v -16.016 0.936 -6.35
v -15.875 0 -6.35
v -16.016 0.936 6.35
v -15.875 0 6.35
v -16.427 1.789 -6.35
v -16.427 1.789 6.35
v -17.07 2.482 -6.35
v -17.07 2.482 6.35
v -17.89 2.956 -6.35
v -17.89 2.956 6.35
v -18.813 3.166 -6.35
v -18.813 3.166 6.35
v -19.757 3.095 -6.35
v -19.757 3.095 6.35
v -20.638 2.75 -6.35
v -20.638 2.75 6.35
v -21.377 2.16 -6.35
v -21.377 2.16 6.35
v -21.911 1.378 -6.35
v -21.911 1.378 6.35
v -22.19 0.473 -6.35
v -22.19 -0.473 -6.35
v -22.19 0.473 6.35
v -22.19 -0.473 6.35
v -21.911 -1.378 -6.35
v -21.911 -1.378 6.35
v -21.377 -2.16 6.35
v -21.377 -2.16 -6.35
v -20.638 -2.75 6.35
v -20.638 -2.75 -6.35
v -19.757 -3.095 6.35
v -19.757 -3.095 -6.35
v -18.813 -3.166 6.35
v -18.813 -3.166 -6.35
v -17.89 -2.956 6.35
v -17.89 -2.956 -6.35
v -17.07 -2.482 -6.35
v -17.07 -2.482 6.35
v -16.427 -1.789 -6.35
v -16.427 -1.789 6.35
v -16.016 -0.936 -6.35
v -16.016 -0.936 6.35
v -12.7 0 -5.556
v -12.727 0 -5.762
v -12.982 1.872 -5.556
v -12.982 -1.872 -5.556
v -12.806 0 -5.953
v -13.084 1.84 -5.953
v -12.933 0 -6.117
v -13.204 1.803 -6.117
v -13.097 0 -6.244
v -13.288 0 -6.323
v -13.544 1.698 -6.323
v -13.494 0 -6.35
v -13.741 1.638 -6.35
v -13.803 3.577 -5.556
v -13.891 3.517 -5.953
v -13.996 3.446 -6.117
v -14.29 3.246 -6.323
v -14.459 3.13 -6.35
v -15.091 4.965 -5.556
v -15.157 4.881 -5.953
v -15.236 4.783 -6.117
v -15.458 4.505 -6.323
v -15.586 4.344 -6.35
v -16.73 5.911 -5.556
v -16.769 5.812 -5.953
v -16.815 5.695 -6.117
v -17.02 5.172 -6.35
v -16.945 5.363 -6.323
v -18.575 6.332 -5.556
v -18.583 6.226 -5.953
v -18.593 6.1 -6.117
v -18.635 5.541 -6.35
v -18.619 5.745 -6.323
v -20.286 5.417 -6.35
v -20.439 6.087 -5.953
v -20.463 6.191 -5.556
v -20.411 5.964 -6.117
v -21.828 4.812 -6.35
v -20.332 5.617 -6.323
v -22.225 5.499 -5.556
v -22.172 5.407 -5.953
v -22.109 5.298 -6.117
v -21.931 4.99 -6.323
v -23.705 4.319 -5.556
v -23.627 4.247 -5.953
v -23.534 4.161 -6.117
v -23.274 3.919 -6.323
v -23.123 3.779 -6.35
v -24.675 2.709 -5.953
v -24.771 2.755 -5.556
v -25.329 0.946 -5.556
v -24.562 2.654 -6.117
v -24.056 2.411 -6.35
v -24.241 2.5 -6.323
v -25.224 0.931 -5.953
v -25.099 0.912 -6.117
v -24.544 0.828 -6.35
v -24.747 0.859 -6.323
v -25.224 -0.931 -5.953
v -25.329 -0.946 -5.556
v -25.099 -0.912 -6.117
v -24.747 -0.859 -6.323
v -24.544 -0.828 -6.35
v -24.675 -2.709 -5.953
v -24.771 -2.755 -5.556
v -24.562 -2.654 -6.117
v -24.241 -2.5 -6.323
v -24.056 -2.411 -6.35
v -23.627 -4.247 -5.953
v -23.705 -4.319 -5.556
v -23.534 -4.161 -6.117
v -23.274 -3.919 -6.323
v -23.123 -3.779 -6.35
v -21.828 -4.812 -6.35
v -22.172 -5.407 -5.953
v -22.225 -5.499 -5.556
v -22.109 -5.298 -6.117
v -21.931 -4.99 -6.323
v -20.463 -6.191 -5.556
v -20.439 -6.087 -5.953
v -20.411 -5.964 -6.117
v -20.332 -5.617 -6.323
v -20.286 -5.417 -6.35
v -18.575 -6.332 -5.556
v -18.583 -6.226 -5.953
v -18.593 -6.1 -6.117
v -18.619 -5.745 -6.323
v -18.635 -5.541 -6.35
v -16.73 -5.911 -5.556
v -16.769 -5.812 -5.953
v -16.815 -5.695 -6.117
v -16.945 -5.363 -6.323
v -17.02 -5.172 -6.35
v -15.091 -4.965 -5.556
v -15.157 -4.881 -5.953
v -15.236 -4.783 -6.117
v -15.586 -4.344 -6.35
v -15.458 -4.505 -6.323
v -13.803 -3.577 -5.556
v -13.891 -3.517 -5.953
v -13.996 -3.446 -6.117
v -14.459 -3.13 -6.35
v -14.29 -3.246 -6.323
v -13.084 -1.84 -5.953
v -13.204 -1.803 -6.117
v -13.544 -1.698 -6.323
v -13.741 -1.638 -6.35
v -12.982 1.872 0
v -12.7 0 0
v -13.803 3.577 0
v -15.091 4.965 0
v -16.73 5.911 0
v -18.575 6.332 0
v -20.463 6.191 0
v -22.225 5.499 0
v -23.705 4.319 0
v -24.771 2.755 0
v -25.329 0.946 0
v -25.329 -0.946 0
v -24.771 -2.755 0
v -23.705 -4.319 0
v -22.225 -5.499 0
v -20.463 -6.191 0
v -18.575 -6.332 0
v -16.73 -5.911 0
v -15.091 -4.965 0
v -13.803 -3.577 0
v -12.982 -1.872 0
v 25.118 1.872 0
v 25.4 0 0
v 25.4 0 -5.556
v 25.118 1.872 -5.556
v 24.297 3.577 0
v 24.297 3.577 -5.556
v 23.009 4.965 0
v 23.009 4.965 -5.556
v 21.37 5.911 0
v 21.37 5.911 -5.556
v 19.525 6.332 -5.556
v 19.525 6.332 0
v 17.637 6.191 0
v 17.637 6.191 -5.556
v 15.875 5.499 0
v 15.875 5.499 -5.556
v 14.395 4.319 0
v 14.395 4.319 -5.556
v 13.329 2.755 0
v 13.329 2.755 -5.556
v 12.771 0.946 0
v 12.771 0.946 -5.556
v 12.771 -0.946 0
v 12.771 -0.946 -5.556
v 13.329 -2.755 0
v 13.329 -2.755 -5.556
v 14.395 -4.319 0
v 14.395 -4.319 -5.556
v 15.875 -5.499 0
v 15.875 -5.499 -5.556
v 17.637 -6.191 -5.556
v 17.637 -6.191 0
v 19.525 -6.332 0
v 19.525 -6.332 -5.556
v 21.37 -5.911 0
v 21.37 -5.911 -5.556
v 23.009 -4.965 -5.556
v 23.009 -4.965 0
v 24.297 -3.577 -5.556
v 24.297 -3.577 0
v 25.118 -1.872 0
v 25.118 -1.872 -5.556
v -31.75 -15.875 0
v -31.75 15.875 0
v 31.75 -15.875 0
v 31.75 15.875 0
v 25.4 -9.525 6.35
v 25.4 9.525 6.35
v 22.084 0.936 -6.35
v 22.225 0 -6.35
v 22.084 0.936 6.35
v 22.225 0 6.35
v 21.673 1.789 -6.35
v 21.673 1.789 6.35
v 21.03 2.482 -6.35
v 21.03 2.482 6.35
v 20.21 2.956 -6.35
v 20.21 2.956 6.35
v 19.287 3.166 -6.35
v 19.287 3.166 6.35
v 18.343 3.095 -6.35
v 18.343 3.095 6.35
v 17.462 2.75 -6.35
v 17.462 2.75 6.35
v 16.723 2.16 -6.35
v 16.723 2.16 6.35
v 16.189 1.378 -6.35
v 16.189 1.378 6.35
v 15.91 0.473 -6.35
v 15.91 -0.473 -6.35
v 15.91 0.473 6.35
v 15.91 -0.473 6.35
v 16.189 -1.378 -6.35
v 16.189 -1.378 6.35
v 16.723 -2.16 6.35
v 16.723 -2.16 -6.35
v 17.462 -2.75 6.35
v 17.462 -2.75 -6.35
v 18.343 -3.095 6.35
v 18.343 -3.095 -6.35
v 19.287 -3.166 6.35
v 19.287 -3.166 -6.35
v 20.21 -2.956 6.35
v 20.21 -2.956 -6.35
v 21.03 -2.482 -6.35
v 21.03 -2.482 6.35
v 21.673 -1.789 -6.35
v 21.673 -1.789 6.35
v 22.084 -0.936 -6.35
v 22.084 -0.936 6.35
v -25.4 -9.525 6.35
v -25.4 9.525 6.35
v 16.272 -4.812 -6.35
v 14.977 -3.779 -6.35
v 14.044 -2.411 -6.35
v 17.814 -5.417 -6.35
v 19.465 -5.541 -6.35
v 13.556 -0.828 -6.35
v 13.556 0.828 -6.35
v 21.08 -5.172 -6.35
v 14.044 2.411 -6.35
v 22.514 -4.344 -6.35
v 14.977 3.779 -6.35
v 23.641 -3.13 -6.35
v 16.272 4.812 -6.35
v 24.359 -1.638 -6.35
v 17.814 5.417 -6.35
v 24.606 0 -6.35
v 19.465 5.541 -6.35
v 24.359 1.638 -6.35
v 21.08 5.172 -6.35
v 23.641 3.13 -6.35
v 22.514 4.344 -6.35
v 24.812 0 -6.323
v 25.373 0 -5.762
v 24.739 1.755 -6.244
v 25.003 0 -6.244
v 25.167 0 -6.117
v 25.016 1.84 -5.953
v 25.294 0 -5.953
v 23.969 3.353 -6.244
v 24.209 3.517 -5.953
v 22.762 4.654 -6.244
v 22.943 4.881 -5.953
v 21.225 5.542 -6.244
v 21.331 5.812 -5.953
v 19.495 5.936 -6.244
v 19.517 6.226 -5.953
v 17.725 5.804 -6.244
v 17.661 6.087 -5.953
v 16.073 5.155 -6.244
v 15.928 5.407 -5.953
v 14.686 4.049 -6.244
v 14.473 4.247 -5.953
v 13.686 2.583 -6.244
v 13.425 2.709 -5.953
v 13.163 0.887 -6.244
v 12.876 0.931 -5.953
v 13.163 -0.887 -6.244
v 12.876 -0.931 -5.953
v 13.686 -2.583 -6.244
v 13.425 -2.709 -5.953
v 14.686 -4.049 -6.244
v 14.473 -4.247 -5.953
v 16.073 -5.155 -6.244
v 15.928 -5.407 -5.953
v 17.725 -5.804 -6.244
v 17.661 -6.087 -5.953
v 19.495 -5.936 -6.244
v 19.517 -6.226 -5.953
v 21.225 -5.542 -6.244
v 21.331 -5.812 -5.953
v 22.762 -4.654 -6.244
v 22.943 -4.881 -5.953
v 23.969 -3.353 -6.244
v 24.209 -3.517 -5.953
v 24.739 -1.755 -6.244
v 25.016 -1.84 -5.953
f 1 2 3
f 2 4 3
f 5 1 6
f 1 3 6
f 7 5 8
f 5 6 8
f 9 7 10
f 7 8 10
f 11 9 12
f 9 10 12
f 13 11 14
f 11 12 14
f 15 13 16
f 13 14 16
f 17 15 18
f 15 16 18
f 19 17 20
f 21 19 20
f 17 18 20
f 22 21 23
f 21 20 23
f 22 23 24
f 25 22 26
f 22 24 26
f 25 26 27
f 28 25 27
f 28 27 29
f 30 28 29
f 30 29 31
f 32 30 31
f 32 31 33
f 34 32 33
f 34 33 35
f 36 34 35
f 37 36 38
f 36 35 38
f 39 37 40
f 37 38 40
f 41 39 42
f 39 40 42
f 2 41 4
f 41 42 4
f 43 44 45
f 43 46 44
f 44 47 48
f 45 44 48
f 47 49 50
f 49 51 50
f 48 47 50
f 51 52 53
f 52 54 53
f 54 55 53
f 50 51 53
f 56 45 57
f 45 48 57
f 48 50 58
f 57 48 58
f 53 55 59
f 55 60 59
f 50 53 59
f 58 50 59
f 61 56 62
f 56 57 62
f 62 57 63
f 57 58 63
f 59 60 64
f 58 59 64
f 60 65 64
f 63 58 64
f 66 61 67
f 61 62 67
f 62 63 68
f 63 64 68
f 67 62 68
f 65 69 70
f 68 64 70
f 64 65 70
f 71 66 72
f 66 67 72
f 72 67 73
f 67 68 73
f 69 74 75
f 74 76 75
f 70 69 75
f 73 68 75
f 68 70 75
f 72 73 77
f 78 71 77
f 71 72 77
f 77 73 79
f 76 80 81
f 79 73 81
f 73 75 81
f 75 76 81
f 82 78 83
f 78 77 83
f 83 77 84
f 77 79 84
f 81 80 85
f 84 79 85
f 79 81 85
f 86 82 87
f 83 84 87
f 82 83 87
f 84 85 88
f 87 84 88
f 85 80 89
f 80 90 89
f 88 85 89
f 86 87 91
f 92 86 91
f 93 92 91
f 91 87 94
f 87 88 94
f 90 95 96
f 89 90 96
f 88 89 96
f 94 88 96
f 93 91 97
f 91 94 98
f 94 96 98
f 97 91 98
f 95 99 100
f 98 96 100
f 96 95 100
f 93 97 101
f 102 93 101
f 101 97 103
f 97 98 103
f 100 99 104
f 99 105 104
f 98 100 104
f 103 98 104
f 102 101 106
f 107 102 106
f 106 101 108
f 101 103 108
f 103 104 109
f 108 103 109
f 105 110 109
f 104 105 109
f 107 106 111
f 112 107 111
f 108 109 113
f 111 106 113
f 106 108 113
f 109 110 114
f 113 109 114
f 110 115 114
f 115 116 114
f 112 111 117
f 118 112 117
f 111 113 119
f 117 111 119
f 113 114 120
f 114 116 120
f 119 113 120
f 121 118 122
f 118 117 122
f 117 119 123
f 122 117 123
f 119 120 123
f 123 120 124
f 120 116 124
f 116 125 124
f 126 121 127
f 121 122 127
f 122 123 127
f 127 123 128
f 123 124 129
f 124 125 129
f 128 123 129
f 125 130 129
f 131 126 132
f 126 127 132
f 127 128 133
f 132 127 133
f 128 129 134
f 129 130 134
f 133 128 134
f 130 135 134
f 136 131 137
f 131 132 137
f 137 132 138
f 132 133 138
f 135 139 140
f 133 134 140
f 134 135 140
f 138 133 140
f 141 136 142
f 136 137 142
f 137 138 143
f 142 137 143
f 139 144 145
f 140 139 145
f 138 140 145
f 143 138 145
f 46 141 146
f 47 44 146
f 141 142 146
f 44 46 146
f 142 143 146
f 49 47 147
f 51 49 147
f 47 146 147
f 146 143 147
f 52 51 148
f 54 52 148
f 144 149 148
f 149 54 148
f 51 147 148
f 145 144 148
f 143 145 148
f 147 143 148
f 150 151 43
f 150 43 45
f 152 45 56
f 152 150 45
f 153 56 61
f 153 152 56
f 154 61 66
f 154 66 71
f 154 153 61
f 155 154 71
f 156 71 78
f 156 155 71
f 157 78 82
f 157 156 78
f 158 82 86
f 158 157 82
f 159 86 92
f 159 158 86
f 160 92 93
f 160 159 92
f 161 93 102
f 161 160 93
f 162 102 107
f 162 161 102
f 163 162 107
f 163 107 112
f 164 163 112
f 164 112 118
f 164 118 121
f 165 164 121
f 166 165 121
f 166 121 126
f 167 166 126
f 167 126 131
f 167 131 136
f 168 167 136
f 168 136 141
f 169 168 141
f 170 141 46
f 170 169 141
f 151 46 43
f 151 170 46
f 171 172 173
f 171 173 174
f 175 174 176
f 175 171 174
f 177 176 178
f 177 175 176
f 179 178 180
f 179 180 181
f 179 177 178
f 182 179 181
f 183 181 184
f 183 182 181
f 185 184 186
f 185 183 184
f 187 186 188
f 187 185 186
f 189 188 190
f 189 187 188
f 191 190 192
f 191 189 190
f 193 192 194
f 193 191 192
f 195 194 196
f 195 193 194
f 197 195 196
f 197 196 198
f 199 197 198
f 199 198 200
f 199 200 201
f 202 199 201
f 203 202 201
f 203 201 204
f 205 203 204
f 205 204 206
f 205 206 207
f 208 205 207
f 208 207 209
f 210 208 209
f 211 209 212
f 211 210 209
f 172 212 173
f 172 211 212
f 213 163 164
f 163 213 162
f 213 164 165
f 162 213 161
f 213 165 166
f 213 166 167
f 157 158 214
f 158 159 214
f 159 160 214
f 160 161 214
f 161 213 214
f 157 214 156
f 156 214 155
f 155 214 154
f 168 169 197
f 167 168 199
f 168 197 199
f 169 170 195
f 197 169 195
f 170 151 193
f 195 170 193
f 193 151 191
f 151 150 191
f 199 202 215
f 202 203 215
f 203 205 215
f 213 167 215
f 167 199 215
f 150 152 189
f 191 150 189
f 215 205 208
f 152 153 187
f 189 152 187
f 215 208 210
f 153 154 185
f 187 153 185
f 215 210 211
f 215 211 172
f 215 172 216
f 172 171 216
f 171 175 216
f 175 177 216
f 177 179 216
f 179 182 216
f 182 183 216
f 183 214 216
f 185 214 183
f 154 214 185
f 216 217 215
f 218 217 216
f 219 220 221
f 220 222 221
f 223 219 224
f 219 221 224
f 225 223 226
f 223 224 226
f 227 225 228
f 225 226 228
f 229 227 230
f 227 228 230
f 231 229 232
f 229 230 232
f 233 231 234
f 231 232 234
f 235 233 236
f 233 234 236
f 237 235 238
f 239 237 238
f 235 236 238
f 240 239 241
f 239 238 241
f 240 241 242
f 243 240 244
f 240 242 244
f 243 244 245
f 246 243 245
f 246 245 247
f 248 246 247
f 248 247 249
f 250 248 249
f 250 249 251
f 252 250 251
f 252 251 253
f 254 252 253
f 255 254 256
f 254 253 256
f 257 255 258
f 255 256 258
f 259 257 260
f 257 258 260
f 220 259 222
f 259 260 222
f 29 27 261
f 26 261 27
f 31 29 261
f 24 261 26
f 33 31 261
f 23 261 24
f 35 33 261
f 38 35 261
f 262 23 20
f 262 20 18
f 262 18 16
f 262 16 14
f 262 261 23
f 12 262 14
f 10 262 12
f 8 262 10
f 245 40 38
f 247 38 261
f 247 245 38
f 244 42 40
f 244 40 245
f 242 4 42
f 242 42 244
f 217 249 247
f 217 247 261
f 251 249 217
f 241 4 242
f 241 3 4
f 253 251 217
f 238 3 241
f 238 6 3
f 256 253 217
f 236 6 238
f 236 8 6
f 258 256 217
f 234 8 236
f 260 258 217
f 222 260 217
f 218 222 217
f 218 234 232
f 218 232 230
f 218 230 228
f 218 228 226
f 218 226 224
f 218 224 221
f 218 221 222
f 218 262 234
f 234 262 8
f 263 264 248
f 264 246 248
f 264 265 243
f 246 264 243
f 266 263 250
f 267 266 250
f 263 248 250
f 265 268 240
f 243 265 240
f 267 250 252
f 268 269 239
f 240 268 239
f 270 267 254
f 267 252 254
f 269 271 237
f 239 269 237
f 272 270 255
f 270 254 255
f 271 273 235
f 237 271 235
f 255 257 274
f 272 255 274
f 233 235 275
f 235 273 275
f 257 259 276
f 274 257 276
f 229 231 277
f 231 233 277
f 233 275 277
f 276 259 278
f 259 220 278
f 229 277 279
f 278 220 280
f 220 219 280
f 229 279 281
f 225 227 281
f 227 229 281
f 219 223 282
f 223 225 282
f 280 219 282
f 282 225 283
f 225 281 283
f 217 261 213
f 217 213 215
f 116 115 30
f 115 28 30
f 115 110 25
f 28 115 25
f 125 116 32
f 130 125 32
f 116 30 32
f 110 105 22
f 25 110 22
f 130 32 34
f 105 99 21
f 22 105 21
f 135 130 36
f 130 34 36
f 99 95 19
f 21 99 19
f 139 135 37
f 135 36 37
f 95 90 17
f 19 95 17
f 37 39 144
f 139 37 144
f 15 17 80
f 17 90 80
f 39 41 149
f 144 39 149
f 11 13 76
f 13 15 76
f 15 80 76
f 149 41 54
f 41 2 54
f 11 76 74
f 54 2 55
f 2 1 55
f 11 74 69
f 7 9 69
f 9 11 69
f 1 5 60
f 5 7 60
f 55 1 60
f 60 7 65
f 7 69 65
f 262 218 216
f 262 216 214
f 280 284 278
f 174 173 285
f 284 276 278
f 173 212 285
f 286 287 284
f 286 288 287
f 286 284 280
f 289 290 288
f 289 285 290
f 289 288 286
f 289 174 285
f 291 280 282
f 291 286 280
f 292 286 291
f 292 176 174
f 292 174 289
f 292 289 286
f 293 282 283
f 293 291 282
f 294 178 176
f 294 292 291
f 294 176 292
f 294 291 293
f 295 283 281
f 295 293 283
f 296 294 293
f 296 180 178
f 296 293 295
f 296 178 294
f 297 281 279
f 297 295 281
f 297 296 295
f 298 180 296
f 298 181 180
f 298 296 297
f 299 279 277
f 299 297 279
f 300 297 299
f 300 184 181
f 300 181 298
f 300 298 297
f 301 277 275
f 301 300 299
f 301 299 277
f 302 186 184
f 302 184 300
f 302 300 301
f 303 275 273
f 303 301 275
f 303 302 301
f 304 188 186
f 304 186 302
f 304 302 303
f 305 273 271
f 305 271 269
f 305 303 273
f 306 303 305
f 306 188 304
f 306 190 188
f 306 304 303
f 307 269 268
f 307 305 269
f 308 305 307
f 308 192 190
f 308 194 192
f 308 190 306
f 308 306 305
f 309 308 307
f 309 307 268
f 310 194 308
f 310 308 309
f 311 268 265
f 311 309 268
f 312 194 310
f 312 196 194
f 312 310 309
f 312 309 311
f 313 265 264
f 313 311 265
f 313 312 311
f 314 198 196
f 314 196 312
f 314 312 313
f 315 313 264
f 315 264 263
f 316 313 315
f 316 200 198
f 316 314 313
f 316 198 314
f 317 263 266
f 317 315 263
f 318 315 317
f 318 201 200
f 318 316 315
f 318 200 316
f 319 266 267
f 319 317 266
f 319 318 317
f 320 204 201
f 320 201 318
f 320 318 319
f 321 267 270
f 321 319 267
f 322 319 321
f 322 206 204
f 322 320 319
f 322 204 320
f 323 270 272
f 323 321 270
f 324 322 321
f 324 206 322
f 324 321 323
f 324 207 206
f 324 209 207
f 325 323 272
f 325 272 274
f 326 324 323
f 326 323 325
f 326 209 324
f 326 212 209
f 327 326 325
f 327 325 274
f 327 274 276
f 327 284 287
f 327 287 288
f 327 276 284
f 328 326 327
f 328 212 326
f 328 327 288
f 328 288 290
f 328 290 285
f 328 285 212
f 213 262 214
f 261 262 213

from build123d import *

# Parameters (mm, degrees)
F0_R     = 6.35
F0_R_2   = 3.175
F1_DEPTH = 6.35
F2_SIZE  = 6.34999
F3_DEPTH = 6.351
F4_DEPTH = 6.35
F5_R     = 0.7939024


# Not quite as in the source:
# - a fillet or chamfer is up to 0.001 mm smaller than in the source, because OpenCascade refuses the exact size


with BuildPart() as f1:
    # F0 (on Top) → F1 (new body)
    with BuildSketch(Plane.XY):
        Polygon((-14.2875, 15.875), (-23.8125, 15.875), (-23.8125, 7.9375), (-31.75, 7.9375), (-31.75, -7.9375), (-23.8125, -7.9375), (-23.8125, -15.875), (-14.2875, -15.875), (-14.2875, -7.9375), (-6.35, -7.9375), (-6.35, -15.875), (6.35, -15.875), (6.35, -7.9375), (14.2875, -7.9375), (14.2875, -15.875), (23.8125, -15.875), (23.8125, -7.9375), (31.75, -7.9375), (31.75, 7.9375), (23.8125, 7.9375), (23.8125, 15.875), (14.2875, 15.875), (14.2875, 7.9375), (6.35, 7.9375), (6.35, 15.875), (-6.35, 15.875), (-6.35, 7.9375), (-14.2875, 7.9375), align=None)
        with Locations((-19.05, 0)):
            Circle(F0_R, mode=Mode.SUBTRACT)
        with Locations((19.05, 0)):
            Circle(F0_R, mode=Mode.SUBTRACT)
        with Locations((-19.05, 0)):
            Circle(F0_R)
        with Locations((-19.05, 0)):
            Circle(F0_R_2, mode=Mode.SUBTRACT)
        with Locations((19.05, 0)):
            Circle(F0_R)
        with Locations((19.05, 0)):
            Circle(F0_R_2, mode=Mode.SUBTRACT)
        with Locations((-19.05, 0)):
            Circle(F0_R_2)
        with Locations((19.05, 0)):
            Circle(F0_R_2)
        Polygon((-23.8125, 7.9375), (-31.75, 15.875), (-31.75, 7.9375), align=None)
        Polygon((-23.8125, 15.875), (-31.75, 15.875), (-23.8125, 7.9375), align=None)
        Polygon((-6.35, 15.875), (-14.2875, 15.875), (-14.2875, 7.9375), align=None)
        Polygon((-6.35, 7.9375), (-6.35, 15.875), (-14.2875, 7.9375), align=None)
        Polygon((14.2875, 7.9375), (6.35, 15.875), (6.35, 7.9375), align=None)
        Polygon((14.2875, 15.875), (6.35, 15.875), (14.2875, 7.9375), align=None)
        Polygon((31.75, 15.875), (23.8125, 15.875), (23.8125, 7.9375), align=None)
        Polygon((31.75, 7.9375), (31.75, 15.875), (23.8125, 7.9375), align=None)
        Polygon((31.75, -15.875), (31.75, -7.9375), (23.8125, -7.9375), align=None)
        Polygon((23.8125, -7.9375), (23.8125, -15.875), (31.75, -15.875), align=None)
        Polygon((14.2875, -7.9375), (6.35, -15.875), (14.2875, -15.875), align=None)
        Polygon((6.35, -7.9375), (6.35, -15.875), (14.2875, -7.9375), align=None)
        Polygon((-14.2875, -7.9375), (-6.35, -15.875), (-6.35, -7.9375), align=None)
        Polygon((-14.2875, -7.9375), (-14.2875, -15.875), (-6.35, -15.875), align=None)
        Polygon((-23.8125, -7.9375), (-31.75, -15.875), (-23.8125, -15.875), align=None)
        Polygon((-23.8125, -7.9375), (-31.75, -7.9375), (-31.75, -15.875), align=None)
    extrude(amount=F1_DEPTH)

    # F2 (size 6.35 in the source; OpenCascade refuses exactly that, so slightly less here)
    f2_edges = [f1.edges().sort_by_distance(p)[0] for p in [
        (31.75, 0, 6.35),
        (0, 15.875, 6.35),
        (-31.75, 0, 6.35),
        (0, -15.875, 6.35),
    ]]
    chamfer(f2_edges, length=F2_SIZE)

    # F0 (on Top) → F3 (cut, through all)
    with BuildSketch(Plane.XY):
        with Locations((-19.05, 0)):
            Circle(F0_R_2)
        with Locations((19.05, 0)):
            Circle(F0_R_2)
    extrude(amount=F3_DEPTH, mode=Mode.SUBTRACT)

    # F0 (on Top) → F4 (join)
    with BuildSketch(Plane.XY):
        with Locations((-19.05, 0)):
            Circle(F0_R)
        with Locations((-19.05, 0)):
            Circle(F0_R_2, mode=Mode.SUBTRACT)
        with Locations((19.05, 0)):
            Circle(F0_R)
        with Locations((19.05, 0)):
            Circle(F0_R_2, mode=Mode.SUBTRACT)
    extrude(amount=-F4_DEPTH)

    # F5
    f5_edges = [f1.edges().sort_by_distance(p)[0] for p in [
        (-25.4, 0, -6.35),
        (12.7, 0, -6.35),
    ]]
    fillet(f5_edges, radius=F5_R)


solid = f1.part
